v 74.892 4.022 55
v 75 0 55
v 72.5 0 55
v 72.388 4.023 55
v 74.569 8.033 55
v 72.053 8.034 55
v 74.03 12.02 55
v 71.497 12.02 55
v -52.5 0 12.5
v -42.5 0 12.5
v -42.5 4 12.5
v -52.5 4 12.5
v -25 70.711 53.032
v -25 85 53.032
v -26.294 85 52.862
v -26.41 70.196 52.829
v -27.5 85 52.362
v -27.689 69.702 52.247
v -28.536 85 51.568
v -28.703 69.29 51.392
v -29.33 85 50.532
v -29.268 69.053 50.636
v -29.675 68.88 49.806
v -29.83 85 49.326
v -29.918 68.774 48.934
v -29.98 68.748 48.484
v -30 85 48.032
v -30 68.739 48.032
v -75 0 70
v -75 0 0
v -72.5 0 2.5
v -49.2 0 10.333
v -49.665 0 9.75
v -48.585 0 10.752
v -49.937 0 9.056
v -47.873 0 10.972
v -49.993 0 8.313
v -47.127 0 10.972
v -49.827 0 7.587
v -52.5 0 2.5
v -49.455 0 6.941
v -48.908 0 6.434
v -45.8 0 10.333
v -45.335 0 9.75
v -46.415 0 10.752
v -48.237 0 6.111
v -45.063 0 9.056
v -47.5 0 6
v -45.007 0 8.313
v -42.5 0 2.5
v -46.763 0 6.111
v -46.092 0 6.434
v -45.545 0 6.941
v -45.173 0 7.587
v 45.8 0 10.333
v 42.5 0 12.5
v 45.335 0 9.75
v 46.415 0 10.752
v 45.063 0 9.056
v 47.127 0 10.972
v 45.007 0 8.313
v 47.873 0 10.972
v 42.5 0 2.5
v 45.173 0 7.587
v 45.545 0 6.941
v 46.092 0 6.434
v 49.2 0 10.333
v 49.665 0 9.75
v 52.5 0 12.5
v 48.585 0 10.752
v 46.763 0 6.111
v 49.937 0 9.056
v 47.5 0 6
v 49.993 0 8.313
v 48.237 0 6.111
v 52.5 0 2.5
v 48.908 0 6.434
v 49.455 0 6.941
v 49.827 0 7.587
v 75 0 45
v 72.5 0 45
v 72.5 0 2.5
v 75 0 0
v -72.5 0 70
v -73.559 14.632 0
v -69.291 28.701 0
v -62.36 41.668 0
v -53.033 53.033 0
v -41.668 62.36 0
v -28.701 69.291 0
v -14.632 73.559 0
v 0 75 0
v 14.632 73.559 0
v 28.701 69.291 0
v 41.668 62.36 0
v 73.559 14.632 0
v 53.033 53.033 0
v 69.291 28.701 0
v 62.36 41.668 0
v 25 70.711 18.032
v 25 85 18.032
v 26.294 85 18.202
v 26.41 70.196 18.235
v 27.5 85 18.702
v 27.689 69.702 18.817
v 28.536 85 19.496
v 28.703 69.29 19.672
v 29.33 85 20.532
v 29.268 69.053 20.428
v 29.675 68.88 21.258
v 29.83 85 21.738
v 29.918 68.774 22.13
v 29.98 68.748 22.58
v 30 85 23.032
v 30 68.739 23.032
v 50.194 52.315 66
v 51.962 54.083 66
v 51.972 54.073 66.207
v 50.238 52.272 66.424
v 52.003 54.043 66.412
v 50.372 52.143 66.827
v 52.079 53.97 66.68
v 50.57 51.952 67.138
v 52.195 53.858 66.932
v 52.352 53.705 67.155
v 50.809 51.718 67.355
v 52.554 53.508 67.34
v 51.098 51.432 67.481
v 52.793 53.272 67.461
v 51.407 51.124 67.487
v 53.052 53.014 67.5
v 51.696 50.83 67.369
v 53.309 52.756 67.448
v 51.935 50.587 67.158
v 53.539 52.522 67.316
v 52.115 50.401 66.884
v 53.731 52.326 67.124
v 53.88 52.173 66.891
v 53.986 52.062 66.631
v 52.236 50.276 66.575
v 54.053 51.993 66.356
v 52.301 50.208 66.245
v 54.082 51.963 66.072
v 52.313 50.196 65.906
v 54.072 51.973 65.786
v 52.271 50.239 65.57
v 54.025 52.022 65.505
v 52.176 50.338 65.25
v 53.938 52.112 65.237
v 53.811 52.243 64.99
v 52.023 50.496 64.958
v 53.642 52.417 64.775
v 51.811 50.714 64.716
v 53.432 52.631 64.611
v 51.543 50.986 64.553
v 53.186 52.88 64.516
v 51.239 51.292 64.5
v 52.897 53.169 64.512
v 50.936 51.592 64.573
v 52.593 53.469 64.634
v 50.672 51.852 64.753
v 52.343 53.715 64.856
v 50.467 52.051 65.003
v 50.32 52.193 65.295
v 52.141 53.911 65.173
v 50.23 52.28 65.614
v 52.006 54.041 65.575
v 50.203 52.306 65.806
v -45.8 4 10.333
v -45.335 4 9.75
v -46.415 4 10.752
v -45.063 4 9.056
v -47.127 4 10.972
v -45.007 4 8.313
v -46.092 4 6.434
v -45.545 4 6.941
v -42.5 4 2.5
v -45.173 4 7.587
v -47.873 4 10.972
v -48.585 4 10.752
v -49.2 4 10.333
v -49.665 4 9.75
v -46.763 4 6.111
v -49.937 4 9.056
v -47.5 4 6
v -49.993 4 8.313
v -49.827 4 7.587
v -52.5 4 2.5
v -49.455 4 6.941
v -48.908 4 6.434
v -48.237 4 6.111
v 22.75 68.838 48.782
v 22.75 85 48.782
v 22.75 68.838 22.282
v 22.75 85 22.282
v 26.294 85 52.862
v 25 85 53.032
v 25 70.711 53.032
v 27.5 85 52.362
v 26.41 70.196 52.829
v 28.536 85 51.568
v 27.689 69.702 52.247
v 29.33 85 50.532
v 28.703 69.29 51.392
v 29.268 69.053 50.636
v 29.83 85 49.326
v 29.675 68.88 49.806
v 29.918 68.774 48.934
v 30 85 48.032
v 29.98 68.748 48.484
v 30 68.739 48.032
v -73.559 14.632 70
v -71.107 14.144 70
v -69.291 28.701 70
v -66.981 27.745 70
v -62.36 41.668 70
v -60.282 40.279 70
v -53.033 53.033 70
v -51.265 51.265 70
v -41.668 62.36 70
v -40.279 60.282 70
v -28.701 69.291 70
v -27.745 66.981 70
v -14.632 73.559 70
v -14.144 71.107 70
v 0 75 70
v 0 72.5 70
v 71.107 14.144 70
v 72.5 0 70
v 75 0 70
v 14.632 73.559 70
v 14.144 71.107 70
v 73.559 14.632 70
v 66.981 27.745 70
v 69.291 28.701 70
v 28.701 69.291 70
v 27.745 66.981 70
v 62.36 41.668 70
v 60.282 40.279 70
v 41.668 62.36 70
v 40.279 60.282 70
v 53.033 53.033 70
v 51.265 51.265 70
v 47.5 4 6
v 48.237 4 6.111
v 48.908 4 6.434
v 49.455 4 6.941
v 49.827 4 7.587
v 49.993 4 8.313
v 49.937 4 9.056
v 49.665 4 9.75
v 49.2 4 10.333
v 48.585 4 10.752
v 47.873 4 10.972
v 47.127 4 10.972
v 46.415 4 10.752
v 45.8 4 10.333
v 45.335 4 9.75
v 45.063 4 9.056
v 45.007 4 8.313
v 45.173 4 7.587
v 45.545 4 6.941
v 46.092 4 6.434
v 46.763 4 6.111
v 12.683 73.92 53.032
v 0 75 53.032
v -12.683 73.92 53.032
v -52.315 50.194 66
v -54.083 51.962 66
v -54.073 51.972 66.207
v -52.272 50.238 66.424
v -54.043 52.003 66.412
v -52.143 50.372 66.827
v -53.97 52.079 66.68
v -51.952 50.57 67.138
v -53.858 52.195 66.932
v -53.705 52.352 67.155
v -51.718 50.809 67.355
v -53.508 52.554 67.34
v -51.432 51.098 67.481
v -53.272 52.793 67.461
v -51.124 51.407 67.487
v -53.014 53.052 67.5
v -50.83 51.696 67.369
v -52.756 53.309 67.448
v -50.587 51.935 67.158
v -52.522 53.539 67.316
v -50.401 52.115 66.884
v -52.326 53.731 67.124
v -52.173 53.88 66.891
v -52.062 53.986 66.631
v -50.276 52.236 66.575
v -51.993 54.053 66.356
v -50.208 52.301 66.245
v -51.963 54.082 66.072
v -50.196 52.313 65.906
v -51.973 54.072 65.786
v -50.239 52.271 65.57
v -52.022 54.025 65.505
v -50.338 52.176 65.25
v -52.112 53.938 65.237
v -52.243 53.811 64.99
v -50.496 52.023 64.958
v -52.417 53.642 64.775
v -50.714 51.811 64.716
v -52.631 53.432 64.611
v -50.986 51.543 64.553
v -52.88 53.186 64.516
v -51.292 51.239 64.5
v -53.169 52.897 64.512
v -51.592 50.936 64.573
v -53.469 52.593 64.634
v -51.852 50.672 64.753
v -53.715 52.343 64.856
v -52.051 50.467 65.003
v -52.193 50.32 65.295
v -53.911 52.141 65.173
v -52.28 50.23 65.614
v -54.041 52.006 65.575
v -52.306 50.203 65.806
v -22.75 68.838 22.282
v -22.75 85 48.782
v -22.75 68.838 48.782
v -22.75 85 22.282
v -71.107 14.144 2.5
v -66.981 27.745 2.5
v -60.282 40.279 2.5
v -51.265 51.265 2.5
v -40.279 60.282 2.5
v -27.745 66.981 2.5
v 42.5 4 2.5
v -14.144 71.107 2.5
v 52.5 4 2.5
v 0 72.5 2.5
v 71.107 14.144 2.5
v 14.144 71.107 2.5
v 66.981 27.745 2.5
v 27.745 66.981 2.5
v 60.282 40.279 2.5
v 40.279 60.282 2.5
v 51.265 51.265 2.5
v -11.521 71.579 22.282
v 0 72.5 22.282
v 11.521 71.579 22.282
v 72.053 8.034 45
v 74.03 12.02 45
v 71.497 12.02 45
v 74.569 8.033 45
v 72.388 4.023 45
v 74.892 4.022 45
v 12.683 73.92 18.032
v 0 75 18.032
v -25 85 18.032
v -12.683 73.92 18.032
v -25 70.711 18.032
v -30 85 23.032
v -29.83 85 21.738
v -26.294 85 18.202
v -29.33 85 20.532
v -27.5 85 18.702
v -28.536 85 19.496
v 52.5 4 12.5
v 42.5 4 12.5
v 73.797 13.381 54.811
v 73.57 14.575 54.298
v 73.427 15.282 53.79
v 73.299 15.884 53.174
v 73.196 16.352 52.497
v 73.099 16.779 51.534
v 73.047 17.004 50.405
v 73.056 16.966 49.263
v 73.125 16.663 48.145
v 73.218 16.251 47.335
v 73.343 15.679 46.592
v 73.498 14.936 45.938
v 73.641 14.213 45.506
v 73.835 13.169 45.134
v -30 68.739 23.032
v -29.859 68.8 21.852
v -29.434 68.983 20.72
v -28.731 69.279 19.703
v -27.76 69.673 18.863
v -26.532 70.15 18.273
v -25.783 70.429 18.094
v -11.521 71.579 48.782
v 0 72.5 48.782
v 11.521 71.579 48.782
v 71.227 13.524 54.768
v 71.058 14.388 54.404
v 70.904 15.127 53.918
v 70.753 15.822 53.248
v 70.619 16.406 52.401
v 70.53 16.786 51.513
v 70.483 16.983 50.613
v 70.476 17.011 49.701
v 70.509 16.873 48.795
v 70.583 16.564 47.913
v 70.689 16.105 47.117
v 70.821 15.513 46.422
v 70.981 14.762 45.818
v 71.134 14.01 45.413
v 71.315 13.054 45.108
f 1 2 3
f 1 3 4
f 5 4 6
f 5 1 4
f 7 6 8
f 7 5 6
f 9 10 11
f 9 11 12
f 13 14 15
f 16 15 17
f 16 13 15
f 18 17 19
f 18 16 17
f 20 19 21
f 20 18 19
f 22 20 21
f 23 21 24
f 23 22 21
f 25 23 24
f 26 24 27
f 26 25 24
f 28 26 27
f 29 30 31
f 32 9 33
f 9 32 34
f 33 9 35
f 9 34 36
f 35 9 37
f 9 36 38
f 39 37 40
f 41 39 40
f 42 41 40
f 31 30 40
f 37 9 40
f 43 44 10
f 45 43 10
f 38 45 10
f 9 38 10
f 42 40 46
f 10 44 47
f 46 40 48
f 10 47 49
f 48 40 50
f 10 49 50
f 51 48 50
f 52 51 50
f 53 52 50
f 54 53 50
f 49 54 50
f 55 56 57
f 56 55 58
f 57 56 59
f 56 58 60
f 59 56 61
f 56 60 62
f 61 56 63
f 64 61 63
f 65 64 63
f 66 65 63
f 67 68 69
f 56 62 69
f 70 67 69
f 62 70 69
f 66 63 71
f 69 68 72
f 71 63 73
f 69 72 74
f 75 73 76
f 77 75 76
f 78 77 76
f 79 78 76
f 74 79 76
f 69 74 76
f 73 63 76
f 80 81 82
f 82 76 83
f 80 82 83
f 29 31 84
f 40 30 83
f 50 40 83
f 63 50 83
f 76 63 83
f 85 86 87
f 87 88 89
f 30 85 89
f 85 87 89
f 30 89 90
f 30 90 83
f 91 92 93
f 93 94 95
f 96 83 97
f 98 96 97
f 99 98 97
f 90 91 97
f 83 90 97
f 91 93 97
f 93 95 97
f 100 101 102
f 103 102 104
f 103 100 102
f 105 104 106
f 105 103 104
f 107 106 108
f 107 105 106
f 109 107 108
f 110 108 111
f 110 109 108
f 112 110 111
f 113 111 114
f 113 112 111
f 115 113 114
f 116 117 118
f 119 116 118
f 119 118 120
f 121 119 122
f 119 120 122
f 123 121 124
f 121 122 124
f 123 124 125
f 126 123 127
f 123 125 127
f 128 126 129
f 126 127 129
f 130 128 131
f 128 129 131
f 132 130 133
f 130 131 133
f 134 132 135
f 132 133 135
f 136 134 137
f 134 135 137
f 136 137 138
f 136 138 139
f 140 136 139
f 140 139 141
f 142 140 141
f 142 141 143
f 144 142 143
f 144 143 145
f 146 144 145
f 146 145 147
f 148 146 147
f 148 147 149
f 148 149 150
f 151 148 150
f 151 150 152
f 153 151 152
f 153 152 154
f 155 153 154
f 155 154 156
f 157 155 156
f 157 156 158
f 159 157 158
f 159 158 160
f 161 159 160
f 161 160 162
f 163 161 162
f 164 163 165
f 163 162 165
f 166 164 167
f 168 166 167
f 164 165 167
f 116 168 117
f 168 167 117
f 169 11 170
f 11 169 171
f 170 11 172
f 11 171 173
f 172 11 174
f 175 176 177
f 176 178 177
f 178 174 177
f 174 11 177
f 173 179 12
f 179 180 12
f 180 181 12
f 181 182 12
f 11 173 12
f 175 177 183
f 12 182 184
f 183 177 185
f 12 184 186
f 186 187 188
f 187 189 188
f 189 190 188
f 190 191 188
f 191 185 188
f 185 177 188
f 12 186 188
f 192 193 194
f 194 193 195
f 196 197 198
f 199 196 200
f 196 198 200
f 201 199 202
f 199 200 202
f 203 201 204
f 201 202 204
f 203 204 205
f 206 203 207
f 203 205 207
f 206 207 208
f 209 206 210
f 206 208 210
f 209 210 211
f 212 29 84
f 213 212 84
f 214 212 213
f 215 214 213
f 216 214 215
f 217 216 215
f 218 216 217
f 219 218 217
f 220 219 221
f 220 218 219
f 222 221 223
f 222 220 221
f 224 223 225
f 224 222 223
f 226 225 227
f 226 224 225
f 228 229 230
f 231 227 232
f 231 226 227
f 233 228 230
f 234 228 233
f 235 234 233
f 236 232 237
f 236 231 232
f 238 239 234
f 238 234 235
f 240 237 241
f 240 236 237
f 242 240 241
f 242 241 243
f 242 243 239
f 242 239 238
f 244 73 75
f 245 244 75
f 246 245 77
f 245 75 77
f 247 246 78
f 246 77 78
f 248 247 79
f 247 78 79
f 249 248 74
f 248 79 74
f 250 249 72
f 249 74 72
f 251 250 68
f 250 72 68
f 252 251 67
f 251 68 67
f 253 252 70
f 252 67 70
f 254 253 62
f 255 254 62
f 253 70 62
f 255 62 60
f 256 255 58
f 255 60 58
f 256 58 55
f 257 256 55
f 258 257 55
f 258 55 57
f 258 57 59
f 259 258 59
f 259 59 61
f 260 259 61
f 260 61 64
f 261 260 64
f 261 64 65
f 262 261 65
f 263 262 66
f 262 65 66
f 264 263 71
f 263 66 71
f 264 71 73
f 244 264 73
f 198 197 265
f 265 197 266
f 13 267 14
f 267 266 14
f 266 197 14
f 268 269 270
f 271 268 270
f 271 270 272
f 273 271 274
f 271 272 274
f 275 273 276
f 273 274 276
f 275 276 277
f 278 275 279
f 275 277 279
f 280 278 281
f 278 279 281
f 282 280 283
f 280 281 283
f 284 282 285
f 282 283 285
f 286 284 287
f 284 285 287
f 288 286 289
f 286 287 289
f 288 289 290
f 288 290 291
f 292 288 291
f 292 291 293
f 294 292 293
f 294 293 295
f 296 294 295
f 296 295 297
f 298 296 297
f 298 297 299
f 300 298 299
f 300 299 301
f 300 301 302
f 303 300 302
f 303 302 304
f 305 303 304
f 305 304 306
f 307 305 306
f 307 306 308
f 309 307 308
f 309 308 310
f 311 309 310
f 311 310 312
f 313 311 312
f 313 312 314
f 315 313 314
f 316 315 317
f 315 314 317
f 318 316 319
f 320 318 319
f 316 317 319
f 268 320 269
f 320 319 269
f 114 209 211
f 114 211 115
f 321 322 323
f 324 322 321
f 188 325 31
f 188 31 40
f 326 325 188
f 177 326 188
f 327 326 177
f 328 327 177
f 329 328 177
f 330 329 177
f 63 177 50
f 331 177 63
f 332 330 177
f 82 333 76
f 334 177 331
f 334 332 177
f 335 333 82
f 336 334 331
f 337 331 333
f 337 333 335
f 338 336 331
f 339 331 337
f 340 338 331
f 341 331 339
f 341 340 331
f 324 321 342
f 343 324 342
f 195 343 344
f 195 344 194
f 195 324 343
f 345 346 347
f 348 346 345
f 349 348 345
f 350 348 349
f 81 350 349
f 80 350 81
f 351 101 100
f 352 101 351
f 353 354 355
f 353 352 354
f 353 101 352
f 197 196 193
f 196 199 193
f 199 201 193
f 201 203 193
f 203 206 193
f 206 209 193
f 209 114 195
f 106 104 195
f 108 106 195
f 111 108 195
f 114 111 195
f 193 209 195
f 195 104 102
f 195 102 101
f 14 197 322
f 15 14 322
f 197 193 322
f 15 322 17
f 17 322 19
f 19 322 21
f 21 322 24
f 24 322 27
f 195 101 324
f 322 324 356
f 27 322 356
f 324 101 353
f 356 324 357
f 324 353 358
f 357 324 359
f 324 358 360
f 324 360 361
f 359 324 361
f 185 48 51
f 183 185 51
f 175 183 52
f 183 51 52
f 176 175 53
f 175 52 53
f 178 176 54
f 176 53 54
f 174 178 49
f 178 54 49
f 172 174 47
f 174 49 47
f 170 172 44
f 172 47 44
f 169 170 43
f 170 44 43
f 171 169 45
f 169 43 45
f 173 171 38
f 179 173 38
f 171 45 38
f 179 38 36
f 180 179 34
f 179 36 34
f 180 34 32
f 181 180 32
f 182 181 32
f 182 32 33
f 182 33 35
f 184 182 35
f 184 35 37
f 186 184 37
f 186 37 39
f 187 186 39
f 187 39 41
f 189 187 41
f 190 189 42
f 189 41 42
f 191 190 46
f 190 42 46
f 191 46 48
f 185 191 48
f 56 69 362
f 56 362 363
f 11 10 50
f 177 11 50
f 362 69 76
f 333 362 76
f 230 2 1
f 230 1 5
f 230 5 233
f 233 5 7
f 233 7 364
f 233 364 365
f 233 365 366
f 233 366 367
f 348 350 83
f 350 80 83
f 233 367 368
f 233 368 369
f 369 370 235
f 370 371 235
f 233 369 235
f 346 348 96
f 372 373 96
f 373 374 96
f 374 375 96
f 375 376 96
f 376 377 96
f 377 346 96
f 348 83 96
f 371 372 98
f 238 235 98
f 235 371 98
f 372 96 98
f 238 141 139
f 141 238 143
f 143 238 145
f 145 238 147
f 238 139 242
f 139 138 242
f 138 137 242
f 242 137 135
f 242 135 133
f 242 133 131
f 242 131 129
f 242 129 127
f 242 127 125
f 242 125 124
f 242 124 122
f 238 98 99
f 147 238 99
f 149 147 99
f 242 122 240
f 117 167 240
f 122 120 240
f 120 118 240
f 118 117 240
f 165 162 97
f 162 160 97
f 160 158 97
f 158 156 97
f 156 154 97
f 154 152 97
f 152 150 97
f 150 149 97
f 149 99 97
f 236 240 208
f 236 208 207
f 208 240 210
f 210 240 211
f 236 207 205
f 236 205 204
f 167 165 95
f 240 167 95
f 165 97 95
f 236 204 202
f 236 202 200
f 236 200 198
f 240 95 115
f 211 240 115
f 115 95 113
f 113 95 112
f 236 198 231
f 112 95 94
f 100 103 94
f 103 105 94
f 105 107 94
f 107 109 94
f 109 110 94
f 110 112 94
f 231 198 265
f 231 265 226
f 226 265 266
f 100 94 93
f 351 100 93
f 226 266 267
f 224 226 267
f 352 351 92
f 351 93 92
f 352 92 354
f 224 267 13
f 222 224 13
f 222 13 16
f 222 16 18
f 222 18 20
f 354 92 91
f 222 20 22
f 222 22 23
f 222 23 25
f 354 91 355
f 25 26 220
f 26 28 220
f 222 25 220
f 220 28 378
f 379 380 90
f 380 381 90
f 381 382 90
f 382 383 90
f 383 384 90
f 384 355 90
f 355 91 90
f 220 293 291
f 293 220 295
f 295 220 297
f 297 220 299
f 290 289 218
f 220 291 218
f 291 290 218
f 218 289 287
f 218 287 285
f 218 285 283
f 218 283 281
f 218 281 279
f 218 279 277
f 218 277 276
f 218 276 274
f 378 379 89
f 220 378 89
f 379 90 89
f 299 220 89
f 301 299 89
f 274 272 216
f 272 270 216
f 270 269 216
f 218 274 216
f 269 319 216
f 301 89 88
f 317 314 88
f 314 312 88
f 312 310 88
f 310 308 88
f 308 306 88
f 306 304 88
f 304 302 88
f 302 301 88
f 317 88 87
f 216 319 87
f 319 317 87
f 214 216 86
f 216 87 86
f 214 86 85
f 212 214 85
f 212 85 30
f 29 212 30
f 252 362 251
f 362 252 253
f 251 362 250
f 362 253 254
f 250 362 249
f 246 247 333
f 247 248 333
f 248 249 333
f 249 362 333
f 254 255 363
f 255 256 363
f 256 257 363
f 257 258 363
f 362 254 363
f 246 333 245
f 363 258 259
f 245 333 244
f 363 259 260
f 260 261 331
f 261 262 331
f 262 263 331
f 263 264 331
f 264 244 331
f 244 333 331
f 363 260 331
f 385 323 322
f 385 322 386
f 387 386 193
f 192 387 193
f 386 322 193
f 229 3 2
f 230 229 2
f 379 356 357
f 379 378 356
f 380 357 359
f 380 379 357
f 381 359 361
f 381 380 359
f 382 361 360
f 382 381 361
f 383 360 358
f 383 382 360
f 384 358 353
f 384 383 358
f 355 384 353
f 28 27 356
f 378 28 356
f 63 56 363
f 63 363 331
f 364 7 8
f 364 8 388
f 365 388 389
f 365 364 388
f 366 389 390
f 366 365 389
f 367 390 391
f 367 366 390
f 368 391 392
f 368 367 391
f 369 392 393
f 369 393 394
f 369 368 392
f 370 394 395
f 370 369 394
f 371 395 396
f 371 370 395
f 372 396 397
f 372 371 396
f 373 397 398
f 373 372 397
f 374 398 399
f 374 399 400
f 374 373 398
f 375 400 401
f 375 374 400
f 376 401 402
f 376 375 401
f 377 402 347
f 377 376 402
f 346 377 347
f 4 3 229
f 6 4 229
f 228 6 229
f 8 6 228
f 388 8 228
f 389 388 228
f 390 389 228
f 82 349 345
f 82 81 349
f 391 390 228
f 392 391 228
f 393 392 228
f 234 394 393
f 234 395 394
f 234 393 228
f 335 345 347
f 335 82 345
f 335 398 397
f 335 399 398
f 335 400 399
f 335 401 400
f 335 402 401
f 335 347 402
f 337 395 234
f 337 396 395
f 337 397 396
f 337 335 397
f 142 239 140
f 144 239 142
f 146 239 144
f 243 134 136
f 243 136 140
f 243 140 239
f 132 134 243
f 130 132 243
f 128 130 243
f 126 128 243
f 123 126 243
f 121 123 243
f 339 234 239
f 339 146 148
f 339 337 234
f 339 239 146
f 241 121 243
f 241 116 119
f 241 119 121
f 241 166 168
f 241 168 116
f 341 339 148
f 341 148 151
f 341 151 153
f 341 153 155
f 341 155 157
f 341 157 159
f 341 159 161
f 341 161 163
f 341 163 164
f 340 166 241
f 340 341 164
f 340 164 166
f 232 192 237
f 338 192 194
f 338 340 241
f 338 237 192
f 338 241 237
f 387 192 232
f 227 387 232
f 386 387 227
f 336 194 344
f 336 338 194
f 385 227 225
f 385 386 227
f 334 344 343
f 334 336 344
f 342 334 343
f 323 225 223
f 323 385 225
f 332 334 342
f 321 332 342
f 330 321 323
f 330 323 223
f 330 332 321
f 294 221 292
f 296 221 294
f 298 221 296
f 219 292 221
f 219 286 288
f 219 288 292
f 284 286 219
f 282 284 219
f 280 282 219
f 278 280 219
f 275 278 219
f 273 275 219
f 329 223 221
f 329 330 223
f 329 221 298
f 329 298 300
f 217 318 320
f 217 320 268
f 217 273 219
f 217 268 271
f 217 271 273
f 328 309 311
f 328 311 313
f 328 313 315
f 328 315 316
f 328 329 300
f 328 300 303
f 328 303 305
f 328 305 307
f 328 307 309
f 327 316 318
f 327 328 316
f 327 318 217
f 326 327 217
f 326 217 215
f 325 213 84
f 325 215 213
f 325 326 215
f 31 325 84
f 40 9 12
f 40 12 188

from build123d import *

# Parameters (mm, degrees)
SZKIC1_R                         = 75
DODANIE_WYCI_GNI_CIE1_DEPTH      = 70
SKORUPA1_T                       = -2.5
SZKIC3_W                         = 13
SZKIC3_H                         = 21
WYTNIJ_WYCI_GNI_CIE1_DEPTH       = 60
SZKIC4_W                         = 9
SZKIC4_H                         = 11
WYTNIJ_WYCI_GNI_CIE2_DEPTH       = 60
DODANIE_WYCI_GNI_CIE2_REACH      = 192.066
DODANIE_WYCI_GNI_CIE2_END_RADIUS = 75
SZKIC7_W                         = 60
SZKIC7_H                         = 35
SZKIC8_W                         = 45.5
SZKIC8_H                         = 26.5
WYTNIJ_WYCI_GNI_CIE4_DEPTH       = 30
ZAOKR_GLENIE1_R                  = 5
WYTNIJ_WYCI_GNI_CIE5_DEPTH       = 14
SZKIC10_R                        = 1.5
WYTNIJ_WYCI_GNI_CIE6_DEPTH       = 10
SZYK_KO_OWY1_COUNT               = 4
PRZECI_CIE1_START                = -75.0000001
PRZECI_CIE1_OUTLINE_W            = 152
PRZECI_CIE1_OUTLINE_H            = 70
PRZECI_CIE1_OUTLINE_W_2          = 13
PRZECI_CIE1_OUTLINE_H_2          = 21
PRZECI_CIE1_OUTLINE_W_3          = 9
PRZECI_CIE1_OUTLINE_H_3          = 11
PRZECI_CIE1_DEPTH                = 75.0000001
SZKIC11_W                        = 10
SZKIC11_H                        = 10
SZKIC11_R                        = 2.5
DODANIE_WYCI_GNI_CIE3_DEPTH      = 4


# Read off the part's stored shape, not the designer's step: Przecięcie1
with BuildPart() as part:
    # Szkic1 → Dodanie-wyciągnięcie1 (new body)
    with BuildSketch(Plane.XY):
        Circle(SZKIC1_R)
    extrude(amount=DODANIE_WYCI_GNI_CIE1_DEPTH)

    # Skorupa1
    skorupa1_openings = [part.faces().sort_by_distance(p)[0] for p in [
        (0, 0, 70),
    ]]
    offset(amount=SKORUPA1_T, openings=skorupa1_openings, kind=Kind.INTERSECTION)

    # Szkic3 → Wytnij-wyciągnięcie1 (cut)
    with BuildSketch(Plane(origin=(0, -75, 0), x_dir=(-1, 0, 0), z_dir=(0, -1, 0))):
        with Locations((0, -35)):
            Rectangle(SZKIC3_W, SZKIC3_H)
    extrude(amount=-WYTNIJ_WYCI_GNI_CIE1_DEPTH, mode=Mode.SUBTRACT)

    # Szkic4 → Wytnij-wyciągnięcie2 (cut)
    with BuildSketch(Plane(origin=(0, -75, 0), x_dir=(-1, 0, 0), z_dir=(0, -1, 0))):
        with Locations((0, -14)):
            Rectangle(SZKIC4_W, SZKIC4_H)
    extrude(amount=-WYTNIJ_WYCI_GNI_CIE2_DEPTH, mode=Mode.SUBTRACT)

    # Dodanie-wyciągnięcie2: up to this cylinder (the profile starts outside it)
    dodanie_wyci_gni_cie2_end = Plane(origin=(0, 0, 35.532003), z_dir=(0, 0, -1)) * Cylinder(DODANIE_WYCI_GNI_CIE2_END_RADIUS, 535.132, mode=Mode.PRIVATE)
    # Szkic7 → Dodanie-wyciągnięcie2 (add, up to the surface)
    with BuildSketch(Plane(origin=(0, 85, 0), x_dir=(-1, 0, 0), z_dir=(0, -1, 0)), mode=Mode.PRIVATE) as dodanie_wyci_gni_cie2_sk1:
        with Locations((0, -35.532003496)):
            Rectangle(SZKIC7_W, SZKIC7_H)
    dodanie_wyci_gni_cie2_tool1 = extrude(dodanie_wyci_gni_cie2_sk1.sketch, amount=DODANIE_WYCI_GNI_CIE2_REACH, mode=Mode.PRIVATE) - dodanie_wyci_gni_cie2_end
    add(dodanie_wyci_gni_cie2_tool1.solids().sort_by_distance((0, 85, 35.532003))[0])

    # Szkic8 → Wytnij-wyciągnięcie4 (cut)
    with BuildSketch(Plane(origin=(0, 85, 0), x_dir=(1, 0, 0), z_dir=(0, 1, 0))):
        with Locations((0, -35.532003496)):
            Rectangle(SZKIC8_W, SZKIC8_H)
    extrude(amount=-WYTNIJ_WYCI_GNI_CIE4_DEPTH, mode=Mode.SUBTRACT)

    # Zaokrąglenie1
    zaokr_glenie1_edges = [part.edges().sort_by_distance(p)[0] for p in [
        (-30, 76.869317712, 18.032003496),
        (-30, 76.869317712, 53.032003496),
        (30, 76.869317712, 18.032003496),
        (30, 76.869317712, 53.032003496),
    ]]
    fillet(zaokr_glenie1_edges, radius=ZAOKR_GLENIE1_R)

    # Szkic9 → Wytnij-wyciągnięcie5 (cut)
    with BuildSketch(Plane(origin=(75, 0, 0), x_dir=(0, 0, -1), z_dir=(1, 0, 0))):
        with BuildLine():
            Line((-55, -12.979686846), (-55, 12.020313154))
            ThreePointArc((-55, 12.020313154), (-50, 17.020313154), (-45, 12.020313154))
            Line((-45, 12.020313154), (-45, -12.979686846))
            ThreePointArc((-45, -12.979686846), (-50, -17.979686846), (-55, -12.979686846))
        make_face()
    extrude(amount=-WYTNIJ_WYCI_GNI_CIE5_DEPTH, mode=Mode.SUBTRACT)

    # Szkic10 → Wytnij-wyciągnięcie6 (cut)
    with BuildSketch(Plane(origin=(53.033008589, 53.033008589, 0), x_dir=(0, 0, -1), z_dir=(0.7071067811865512, 0.7071067811865438, 0))):
        with Locations(Location((-66, 0, 0), (0, 0, 90))):
            Circle(SZKIC10_R)
    wytnij_wyci_gni_cie6 = extrude(amount=-WYTNIJ_WYCI_GNI_CIE6_DEPTH, mode=Mode.SUBTRACT)

    # Szyk kołowy1: Wytnij-wyciągnięcie6 ×4 about axis
    szyk_ko_owy1_axis = Axis((0, 0, 70), (0, 0, -1))
    for i in range(1, SZYK_KO_OWY1_COUNT):
        add(wytnij_wyci_gni_cie6.rotate(szyk_ko_owy1_axis, i * 360 / SZYK_KO_OWY1_COUNT), mode=Mode.SUBTRACT)

    # Przecięcie1 outline → Przecięcie1 (cut)
    with BuildSketch(Plane(origin=(0, 0, 0), x_dir=(1, 0, 0), z_dir=(0, 1, 0)).offset(PRZECI_CIE1_START)):
        with Locations((0, -35)):
            Rectangle(PRZECI_CIE1_OUTLINE_W, PRZECI_CIE1_OUTLINE_H)
        with Locations((0, -35)):
            Rectangle(PRZECI_CIE1_OUTLINE_W_2, PRZECI_CIE1_OUTLINE_H_2, mode=Mode.SUBTRACT)
        with Locations((0, -14)):
            Rectangle(PRZECI_CIE1_OUTLINE_W_3, PRZECI_CIE1_OUTLINE_H_3, mode=Mode.SUBTRACT)
    extrude(amount=PRZECI_CIE1_DEPTH, mode=Mode.SUBTRACT)

    # Szkic11 → Dodanie-wyciągnięcie3 (add)
    # profile 1 of 2: a face of its own
    with BuildSketch(Plane(origin=(0, 0, 0), x_dir=(-1, 0, 0), z_dir=(0, -1, 0))):
        with Locations((47.5, -7.5)):
            Rectangle(SZKIC11_W, SZKIC11_H)
        with Locations(Location((47.5, -8.5, 0), (0, 0, 90))):
            Circle(SZKIC11_R, mode=Mode.SUBTRACT)
    # profile 2 of 2: a face of its own
    with BuildSketch(Plane(origin=(0, 0, 0), x_dir=(-1, 0, 0), z_dir=(0, -1, 0))):
        with Locations((-47.5, -7.5)):
            Rectangle(SZKIC11_W, SZKIC11_H)
        with Locations(Location((-47.5, -8.5, 0), (0, 0, 90))):
            Circle(SZKIC11_R, mode=Mode.SUBTRACT)
    extrude(amount=-DODANIE_WYCI_GNI_CIE3_DEPTH)


solid = part.part
